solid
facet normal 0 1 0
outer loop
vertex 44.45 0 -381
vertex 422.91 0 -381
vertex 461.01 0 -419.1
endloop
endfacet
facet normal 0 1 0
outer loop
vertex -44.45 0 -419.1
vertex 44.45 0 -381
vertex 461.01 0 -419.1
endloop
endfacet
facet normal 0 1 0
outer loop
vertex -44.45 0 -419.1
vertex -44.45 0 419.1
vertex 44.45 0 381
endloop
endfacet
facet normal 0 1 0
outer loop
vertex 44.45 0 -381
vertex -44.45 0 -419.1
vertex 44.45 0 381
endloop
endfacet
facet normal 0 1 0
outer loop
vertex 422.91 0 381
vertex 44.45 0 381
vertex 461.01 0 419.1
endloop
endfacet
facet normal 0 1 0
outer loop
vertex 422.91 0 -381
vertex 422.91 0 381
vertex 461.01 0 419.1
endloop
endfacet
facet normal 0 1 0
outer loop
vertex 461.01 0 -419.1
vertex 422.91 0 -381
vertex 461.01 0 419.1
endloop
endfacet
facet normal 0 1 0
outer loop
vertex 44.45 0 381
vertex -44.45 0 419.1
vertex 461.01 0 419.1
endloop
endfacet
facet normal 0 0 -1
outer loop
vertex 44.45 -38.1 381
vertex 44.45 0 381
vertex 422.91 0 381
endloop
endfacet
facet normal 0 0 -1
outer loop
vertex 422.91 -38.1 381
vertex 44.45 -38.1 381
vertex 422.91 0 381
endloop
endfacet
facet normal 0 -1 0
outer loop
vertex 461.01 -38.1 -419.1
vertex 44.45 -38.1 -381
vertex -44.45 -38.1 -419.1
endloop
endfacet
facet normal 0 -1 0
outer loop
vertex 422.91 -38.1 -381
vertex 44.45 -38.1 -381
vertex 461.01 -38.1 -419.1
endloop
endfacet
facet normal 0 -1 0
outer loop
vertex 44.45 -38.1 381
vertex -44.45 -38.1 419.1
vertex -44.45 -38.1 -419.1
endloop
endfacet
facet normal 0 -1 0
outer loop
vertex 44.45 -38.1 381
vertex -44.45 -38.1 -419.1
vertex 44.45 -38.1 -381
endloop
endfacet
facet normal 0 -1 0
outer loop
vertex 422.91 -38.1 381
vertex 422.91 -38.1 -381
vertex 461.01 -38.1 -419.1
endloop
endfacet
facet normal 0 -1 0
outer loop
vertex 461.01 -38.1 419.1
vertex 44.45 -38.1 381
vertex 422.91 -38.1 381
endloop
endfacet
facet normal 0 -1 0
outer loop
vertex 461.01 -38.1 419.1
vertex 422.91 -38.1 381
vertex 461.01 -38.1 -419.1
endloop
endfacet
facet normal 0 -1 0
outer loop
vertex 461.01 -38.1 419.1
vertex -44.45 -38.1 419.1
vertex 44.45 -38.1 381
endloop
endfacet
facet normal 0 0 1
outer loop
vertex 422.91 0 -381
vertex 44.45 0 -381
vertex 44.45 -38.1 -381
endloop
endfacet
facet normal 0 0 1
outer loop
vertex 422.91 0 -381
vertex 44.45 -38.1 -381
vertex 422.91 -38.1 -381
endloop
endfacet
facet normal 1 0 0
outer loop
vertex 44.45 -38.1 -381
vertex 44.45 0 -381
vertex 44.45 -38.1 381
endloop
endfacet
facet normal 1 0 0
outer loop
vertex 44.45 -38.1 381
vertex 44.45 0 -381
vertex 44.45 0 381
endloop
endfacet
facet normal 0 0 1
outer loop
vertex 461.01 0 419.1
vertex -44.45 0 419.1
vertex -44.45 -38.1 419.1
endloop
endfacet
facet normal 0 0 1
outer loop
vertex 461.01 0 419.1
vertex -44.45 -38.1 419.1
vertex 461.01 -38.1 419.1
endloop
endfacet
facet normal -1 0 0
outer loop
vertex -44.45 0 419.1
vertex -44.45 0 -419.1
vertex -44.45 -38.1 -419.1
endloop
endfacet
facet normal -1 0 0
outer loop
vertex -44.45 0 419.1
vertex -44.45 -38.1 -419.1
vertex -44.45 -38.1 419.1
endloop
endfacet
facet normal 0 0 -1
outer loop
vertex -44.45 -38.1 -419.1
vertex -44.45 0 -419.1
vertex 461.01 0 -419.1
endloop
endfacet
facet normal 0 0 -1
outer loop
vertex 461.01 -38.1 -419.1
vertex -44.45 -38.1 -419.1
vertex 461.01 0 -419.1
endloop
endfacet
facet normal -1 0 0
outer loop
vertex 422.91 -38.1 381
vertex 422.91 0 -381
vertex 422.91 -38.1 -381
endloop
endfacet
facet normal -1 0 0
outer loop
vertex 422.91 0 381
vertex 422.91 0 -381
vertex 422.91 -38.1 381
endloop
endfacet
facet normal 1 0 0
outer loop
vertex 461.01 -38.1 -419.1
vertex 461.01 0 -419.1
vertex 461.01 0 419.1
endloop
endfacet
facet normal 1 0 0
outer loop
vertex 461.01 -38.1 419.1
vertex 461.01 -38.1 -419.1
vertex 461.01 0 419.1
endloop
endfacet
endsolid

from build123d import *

# Parameters (mm, degrees)
F0_W     = 88.9
F0_H     = 762
F1_DEPTH = 38.1
F2_W     = 505.46
F2_H     = 38.1
F3_DEPTH = 38.1
F4_W     = 38.1
F4_H     = 762
F5_DEPTH = 38.1
F6_W     = 505.46
F6_H     = 38.1
F7_DEPTH = 38.1


with BuildPart() as f1:
    # F0 (on Front) → F1 (new body)
    with BuildSketch(Plane.XZ):
        Rectangle(F0_W, F0_H)
    extrude(amount=F1_DEPTH)

    # F2 (on Front) → F3 (join)
    with BuildSketch(Plane.XZ):
        with Locations((208.28, 400.05)):
            Rectangle(F2_W, F2_H)
    extrude(amount=F3_DEPTH)

    # F4 (on Front) → F5 (join)
    with BuildSketch(Plane.XZ):
        with Locations((441.96, 0)):
            Rectangle(F4_W, F4_H)
    extrude(amount=F5_DEPTH)

    # F6 (on Front) → F7 (join)
    with BuildSketch(Plane.XZ):
        with Locations((208.28, -400.05)):
            Rectangle(F6_W, F6_H)
    extrude(amount=F7_DEPTH)


solid = f1.part
